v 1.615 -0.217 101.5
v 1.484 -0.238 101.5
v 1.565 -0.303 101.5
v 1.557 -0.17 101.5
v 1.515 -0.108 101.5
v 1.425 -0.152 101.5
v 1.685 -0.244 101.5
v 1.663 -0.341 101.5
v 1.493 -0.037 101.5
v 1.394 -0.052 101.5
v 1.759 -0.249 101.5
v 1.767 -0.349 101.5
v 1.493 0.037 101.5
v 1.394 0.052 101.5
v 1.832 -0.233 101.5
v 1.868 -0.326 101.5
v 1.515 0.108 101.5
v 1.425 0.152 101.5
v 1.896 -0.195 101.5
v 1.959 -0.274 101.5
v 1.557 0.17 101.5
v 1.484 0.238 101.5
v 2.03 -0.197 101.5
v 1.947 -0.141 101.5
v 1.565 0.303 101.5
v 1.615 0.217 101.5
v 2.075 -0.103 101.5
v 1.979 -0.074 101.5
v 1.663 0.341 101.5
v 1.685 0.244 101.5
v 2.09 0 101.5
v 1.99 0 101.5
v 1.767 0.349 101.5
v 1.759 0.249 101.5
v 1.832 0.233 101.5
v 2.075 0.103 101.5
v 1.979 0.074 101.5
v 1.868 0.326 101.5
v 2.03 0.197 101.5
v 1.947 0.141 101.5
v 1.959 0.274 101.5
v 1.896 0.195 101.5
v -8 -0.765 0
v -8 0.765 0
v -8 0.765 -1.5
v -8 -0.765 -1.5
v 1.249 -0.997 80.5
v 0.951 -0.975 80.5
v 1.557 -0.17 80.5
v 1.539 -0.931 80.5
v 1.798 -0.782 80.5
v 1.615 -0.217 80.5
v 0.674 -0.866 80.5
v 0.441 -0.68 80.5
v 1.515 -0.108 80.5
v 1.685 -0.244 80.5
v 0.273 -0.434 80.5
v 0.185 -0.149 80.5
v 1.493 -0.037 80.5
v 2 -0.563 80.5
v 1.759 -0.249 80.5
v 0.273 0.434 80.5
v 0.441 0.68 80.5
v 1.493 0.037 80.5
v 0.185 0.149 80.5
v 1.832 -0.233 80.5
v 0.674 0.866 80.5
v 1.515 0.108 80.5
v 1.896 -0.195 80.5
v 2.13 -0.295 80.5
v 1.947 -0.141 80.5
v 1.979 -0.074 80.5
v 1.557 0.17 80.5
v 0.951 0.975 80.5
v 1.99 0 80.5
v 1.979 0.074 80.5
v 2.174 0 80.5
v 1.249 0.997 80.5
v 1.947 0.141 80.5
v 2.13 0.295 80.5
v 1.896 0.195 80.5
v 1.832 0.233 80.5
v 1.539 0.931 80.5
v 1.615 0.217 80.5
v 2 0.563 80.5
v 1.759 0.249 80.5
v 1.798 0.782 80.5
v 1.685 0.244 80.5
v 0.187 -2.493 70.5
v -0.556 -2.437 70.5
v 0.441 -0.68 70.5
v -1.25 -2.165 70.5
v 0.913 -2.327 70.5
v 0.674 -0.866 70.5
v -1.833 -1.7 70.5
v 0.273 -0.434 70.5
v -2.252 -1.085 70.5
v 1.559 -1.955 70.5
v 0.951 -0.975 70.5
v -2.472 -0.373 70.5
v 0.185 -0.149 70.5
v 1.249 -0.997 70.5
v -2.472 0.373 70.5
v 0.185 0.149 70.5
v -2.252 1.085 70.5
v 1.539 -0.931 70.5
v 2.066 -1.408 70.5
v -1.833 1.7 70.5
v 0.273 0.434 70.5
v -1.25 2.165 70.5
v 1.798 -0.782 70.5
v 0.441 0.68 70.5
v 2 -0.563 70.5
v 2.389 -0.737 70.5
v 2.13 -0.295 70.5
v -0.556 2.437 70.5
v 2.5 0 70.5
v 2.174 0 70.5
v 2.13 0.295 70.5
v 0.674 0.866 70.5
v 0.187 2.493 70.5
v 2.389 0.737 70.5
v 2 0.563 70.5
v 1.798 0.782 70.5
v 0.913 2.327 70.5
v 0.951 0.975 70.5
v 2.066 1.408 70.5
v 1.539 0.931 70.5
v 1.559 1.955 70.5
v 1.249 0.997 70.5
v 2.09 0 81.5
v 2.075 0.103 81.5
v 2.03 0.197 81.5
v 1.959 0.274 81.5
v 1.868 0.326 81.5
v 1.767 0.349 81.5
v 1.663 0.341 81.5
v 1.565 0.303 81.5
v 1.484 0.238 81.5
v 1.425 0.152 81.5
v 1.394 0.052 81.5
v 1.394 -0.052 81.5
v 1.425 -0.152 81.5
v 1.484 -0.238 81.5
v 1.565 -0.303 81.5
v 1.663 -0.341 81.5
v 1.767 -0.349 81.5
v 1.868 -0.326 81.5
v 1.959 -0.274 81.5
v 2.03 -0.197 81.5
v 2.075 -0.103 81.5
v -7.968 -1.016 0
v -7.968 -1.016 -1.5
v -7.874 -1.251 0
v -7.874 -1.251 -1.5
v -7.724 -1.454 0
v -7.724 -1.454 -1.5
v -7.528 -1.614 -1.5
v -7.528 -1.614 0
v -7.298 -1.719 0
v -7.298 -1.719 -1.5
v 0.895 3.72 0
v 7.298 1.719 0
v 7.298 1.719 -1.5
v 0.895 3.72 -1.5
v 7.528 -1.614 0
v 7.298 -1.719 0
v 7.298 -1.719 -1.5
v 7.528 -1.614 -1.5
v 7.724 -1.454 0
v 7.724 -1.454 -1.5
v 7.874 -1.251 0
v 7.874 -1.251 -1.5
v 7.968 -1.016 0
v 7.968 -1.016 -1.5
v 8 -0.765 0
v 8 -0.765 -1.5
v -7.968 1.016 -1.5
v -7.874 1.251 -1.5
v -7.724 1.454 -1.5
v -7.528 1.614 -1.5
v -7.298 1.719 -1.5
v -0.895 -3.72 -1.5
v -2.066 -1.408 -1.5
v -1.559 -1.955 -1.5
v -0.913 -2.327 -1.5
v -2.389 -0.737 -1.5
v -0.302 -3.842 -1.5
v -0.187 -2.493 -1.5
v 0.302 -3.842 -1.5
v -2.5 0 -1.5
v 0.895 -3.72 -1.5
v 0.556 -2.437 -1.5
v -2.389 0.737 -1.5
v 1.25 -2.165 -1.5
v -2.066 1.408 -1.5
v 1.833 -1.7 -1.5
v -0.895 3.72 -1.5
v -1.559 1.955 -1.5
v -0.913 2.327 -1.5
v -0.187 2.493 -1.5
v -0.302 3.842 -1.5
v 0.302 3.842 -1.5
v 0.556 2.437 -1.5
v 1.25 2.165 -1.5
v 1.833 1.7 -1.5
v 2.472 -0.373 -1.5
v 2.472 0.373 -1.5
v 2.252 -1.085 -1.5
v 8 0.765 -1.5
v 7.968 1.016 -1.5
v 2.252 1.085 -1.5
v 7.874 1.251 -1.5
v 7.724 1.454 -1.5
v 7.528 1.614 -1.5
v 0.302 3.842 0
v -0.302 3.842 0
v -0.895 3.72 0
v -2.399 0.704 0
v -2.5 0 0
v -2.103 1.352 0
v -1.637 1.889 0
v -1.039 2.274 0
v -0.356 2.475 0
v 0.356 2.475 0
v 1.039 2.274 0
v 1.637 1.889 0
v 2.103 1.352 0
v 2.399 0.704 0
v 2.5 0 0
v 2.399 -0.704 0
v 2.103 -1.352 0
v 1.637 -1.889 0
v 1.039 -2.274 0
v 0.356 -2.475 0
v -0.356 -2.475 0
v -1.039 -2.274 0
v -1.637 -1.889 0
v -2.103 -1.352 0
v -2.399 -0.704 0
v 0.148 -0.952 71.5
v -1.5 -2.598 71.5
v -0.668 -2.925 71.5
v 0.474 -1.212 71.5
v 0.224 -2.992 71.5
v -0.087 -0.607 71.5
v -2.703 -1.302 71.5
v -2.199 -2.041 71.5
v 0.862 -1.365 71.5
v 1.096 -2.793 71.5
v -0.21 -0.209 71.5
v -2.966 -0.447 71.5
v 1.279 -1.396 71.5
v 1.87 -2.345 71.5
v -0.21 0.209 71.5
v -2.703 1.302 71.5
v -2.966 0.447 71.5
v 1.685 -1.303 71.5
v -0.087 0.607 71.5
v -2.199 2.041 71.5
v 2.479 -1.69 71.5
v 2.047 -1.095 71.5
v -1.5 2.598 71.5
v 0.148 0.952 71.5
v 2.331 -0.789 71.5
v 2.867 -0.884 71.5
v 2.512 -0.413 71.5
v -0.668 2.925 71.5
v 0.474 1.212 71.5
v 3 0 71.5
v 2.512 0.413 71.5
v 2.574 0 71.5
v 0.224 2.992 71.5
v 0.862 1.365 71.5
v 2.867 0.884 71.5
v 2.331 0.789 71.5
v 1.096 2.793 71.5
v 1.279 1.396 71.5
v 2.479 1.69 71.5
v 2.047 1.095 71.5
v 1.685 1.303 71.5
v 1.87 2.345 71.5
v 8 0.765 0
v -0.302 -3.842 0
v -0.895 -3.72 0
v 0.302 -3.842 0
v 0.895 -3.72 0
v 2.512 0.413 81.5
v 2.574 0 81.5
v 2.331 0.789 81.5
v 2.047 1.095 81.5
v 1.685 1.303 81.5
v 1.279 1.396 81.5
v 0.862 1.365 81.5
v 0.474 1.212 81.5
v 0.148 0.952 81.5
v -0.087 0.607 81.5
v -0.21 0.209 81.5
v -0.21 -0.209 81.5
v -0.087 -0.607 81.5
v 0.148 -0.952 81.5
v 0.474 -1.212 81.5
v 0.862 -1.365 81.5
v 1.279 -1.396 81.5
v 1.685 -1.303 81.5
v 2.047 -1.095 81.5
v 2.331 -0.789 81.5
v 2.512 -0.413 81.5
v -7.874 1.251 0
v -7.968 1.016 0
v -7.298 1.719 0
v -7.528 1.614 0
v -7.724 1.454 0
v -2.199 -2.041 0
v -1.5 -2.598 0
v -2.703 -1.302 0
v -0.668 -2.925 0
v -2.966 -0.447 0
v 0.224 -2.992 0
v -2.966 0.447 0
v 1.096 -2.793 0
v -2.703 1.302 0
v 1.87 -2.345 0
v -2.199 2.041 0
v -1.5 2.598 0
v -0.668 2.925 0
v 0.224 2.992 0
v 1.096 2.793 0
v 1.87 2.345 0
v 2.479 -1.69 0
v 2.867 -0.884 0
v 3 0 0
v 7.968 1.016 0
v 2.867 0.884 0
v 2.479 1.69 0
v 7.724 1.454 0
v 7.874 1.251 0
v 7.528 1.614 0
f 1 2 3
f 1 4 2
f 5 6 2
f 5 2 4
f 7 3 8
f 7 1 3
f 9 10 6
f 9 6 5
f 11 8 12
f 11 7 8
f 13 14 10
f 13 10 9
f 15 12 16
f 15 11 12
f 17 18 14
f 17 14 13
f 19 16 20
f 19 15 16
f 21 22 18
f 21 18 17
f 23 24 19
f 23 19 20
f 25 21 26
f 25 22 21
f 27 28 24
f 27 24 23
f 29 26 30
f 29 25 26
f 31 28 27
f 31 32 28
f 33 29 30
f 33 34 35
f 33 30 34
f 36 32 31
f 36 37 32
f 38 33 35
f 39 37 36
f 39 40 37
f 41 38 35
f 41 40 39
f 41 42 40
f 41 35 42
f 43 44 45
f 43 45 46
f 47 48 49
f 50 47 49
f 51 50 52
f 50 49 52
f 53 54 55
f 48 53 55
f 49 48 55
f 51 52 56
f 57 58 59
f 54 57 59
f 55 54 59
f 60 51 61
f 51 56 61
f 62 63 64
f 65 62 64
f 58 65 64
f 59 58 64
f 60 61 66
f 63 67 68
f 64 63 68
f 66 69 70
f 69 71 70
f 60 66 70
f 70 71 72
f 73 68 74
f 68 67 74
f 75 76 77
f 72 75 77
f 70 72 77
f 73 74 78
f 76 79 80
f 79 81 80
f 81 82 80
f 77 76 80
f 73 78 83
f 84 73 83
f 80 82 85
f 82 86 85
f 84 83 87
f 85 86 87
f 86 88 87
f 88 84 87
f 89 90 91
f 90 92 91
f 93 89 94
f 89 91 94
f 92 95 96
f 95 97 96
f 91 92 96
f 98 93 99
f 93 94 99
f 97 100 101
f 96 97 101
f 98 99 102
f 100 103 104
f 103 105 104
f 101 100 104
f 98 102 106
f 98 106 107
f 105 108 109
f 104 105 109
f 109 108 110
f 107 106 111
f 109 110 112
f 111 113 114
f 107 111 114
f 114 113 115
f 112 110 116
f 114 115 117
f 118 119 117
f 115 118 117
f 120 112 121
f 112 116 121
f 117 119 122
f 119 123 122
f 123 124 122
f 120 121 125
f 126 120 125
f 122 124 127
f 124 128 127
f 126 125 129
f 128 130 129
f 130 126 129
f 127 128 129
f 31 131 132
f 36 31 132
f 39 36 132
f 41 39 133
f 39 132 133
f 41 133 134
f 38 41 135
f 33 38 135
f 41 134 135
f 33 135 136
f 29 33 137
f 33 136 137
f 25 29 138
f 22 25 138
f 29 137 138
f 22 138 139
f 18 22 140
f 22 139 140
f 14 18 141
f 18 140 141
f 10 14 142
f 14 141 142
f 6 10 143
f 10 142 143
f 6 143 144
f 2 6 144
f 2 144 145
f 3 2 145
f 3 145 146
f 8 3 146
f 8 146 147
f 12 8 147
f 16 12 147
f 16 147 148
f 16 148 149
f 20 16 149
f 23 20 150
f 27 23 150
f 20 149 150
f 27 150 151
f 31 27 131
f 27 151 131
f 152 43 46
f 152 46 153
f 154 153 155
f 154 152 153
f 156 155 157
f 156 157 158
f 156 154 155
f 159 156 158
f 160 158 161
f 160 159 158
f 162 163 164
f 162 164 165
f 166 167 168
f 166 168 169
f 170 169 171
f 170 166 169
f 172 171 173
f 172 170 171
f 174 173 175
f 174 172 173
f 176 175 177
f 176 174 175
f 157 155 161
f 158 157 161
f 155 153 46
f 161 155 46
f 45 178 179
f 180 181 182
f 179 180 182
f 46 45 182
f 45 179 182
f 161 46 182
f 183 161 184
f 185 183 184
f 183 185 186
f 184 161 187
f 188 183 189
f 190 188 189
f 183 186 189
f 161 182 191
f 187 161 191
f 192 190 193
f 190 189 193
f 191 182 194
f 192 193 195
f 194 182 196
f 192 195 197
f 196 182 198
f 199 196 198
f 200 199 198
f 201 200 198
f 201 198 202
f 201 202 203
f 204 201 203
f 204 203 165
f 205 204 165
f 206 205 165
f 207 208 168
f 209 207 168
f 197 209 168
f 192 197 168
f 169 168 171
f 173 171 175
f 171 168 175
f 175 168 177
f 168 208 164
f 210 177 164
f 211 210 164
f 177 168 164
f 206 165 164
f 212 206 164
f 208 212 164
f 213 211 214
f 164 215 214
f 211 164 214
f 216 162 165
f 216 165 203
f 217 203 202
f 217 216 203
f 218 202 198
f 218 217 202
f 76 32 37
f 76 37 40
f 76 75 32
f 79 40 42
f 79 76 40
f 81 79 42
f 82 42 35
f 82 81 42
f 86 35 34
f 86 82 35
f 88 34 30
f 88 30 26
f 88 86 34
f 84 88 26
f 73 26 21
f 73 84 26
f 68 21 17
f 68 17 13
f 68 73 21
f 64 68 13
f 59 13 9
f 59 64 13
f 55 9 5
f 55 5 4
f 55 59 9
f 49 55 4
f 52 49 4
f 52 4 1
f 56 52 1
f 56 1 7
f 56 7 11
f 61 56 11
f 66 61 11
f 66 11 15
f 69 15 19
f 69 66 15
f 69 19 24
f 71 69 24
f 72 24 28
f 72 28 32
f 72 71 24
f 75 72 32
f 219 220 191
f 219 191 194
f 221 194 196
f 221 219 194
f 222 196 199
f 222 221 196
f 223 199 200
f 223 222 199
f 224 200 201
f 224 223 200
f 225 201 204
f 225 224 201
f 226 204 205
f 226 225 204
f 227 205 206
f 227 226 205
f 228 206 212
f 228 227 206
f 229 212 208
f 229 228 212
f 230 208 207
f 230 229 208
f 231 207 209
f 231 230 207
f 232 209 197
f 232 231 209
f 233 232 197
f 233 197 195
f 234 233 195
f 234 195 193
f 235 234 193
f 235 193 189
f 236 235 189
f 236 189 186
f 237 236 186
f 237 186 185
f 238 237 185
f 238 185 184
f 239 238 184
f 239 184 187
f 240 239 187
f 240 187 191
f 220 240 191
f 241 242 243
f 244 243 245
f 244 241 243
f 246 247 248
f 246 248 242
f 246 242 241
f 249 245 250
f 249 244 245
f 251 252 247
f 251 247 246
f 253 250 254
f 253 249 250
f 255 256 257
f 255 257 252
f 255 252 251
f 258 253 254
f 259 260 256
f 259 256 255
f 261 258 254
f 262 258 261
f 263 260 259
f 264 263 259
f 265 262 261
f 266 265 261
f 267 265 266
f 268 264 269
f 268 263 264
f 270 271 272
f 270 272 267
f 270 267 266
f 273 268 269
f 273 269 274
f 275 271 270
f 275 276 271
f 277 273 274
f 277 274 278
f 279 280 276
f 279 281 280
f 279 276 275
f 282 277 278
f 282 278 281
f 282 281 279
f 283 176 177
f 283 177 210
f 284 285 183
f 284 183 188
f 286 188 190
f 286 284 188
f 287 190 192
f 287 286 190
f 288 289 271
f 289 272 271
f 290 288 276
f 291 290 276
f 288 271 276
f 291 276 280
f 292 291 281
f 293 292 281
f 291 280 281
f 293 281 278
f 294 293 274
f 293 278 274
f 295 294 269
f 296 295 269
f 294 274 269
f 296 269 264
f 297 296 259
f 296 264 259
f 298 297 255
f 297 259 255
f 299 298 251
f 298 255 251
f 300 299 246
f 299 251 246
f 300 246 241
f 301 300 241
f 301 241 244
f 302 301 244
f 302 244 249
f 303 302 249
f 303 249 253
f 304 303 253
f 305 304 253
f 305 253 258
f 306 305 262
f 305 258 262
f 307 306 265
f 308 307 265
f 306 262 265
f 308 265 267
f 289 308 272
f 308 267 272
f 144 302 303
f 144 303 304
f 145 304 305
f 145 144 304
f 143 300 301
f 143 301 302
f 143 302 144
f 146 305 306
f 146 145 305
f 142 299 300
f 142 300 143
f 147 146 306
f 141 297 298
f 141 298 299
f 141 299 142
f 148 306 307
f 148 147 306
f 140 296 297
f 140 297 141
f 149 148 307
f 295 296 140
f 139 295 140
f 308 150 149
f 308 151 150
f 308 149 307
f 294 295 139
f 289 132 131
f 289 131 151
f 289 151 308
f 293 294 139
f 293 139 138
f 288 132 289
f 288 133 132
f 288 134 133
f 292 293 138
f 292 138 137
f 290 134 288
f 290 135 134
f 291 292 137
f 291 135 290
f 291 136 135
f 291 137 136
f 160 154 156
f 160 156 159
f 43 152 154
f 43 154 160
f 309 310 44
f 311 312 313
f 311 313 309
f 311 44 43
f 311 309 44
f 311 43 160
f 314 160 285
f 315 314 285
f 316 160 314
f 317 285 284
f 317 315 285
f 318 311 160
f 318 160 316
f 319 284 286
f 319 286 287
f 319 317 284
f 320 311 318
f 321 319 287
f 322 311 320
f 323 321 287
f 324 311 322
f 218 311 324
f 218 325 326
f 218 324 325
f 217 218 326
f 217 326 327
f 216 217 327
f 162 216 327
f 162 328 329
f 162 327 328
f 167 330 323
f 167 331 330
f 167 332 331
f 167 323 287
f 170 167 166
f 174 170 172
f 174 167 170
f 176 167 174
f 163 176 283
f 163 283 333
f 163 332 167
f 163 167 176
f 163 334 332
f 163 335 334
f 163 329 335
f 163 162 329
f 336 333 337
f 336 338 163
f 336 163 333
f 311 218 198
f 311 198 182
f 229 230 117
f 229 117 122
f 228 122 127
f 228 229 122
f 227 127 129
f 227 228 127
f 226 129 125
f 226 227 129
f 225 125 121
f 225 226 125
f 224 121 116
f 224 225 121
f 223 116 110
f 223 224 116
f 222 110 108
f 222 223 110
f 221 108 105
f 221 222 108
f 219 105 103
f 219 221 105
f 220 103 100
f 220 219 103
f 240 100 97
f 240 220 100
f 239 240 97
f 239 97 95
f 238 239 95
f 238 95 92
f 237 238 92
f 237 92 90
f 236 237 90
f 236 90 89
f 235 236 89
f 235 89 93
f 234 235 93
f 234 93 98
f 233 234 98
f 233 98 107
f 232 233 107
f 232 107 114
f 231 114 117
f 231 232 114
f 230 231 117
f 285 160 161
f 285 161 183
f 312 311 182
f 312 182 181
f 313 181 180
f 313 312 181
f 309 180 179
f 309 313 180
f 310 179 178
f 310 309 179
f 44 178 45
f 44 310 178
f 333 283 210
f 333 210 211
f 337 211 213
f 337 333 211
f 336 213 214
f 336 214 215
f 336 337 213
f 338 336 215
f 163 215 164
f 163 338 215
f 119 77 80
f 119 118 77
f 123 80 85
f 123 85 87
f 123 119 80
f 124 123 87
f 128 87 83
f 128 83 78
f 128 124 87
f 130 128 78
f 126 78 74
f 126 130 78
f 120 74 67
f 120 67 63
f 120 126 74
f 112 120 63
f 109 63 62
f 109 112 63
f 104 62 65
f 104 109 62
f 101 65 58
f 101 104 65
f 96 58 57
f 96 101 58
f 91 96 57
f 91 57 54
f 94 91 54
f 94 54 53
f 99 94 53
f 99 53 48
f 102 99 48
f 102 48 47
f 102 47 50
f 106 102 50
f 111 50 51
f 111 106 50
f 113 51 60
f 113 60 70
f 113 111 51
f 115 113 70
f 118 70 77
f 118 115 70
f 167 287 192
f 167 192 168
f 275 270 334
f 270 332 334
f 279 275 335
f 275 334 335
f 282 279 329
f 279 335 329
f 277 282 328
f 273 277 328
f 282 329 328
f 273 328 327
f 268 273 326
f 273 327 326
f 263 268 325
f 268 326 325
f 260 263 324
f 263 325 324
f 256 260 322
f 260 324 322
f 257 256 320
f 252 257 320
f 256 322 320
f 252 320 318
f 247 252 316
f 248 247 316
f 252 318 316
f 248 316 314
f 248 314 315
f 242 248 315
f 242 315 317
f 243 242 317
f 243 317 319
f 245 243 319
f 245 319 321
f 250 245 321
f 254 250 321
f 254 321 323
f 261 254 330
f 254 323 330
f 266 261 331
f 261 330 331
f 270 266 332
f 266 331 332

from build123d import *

# Parameters (mm, degrees)
SKETCH_1_R      = 3
SKETCH_1_R_2    = 2.5
EXTRUDE_1_DEPTH = 71.5
SKETCH_2_R      = 3
SKETCH_2_R_2    = 1
EXTRUDE_2_DEPTH = 1
SKETCH_3_R      = 2.5
EXTRUDE_3_DEPTH = 1.5
SKETCH_4_R      = 1.4
SKETCH_4_R_2    = 1
EXTRUDE_4_DEPTH = 9
SKETCH_5_R      = 1.4
SKETCH_5_R_2    = 0.25
EXTRUDE_5_DEPTH = 1
SKETCH_6_R      = 0.35
SKETCH_6_R_2    = 0.25
EXTRUDE_6_DEPTH = 20


with BuildPart() as part:
    # 草图1 → 凸台-拉伸1 (new body)
    with BuildSketch(Plane.XY):
        Circle(SKETCH_1_R)
        Circle(SKETCH_1_R_2, mode=Mode.SUBTRACT)
    extrude(amount=EXTRUDE_1_DEPTH)

    # 草图2 → 凸台-拉伸2 (add)
    with BuildSketch(Plane.XY.offset(71.5)):
        Circle(SKETCH_2_R)
        with Locations((1.174015937, 0)):
            Circle(SKETCH_2_R_2, mode=Mode.SUBTRACT)
    extrude(amount=-EXTRUDE_2_DEPTH)

    # 草图3 → 凸台-拉伸3 (add)
    with BuildSketch(Plane(origin=(0, 0, 0), x_dir=(-1, 0, 0), z_dir=(0, 0, -1))):
        with BuildLine():
            Line((7.298274993, -1.719289065), (0.894824979, -3.720367194))
            ThreePointArc((0.894824979, -3.720367194), (0, -3.85692726), (-0.894824979, -3.720367194))
            Line((-0.894824979, -3.720367194), (-7.298274993, -1.719289065))
            ThreePointArc((-7.298274993, -1.719289065), (-7.805690695, -1.357145565), (-8, -0.764809087))
            Line((-8, -0.764809087), (-8, 0))
            Line((-8, 0), (-8, 0.764809087))
            ThreePointArc((-8, 0.764809087), (-7.805690695, 1.357145565), (-7.298274993, 1.719289065))
            Line((-7.298274993, 1.719289065), (-0.894824979, 3.720367194))
            ThreePointArc((-0.894824979, 3.720367194), (0, 3.85692726), (0.894824979, 3.720367194))
            Line((0.894824979, 3.720367194), (7.298274993, 1.719289065))
            ThreePointArc((7.298274993, 1.719289065), (7.805690695, 1.357145565), (8, 0.764809087))
            Line((8, 0.764809087), (8, 0))
            Line((8, 0), (8, -0.764809087))
            ThreePointArc((8, -0.764809087), (7.805690695, -1.357145565), (7.298274993, -1.719289065))
        make_face()
        Circle(SKETCH_3_R, mode=Mode.SUBTRACT)
    extrude(amount=EXTRUDE_3_DEPTH)

    # 草图4 → 凸台-拉伸4 (add)
    with BuildSketch(Plane.XY.offset(71.5)):
        with Locations((1.174015937, 0)):
            Circle(SKETCH_4_R)
        with Locations((1.174015937, 0)):
            Circle(SKETCH_4_R_2, mode=Mode.SUBTRACT)
    extrude(amount=EXTRUDE_4_DEPTH)

    # 草图5 → 凸台-拉伸5 (add)
    with BuildSketch(Plane.XY.offset(80.5)):
        with Locations((1.174015937, 0)):
            Circle(SKETCH_5_R)
        with Locations((1.74042038, 0)):
            Circle(SKETCH_5_R_2, mode=Mode.SUBTRACT)
    extrude(amount=EXTRUDE_5_DEPTH)

    # 草图6 → 凸台-拉伸6 (add)
    with BuildSketch(Plane.XY.offset(81.5)):
        with Locations((1.74042038, 0)):
            Circle(SKETCH_6_R)
        with Locations((1.74042038, 0)):
            Circle(SKETCH_6_R_2, mode=Mode.SUBTRACT)
    extrude(amount=EXTRUDE_6_DEPTH)


solid = part.part
